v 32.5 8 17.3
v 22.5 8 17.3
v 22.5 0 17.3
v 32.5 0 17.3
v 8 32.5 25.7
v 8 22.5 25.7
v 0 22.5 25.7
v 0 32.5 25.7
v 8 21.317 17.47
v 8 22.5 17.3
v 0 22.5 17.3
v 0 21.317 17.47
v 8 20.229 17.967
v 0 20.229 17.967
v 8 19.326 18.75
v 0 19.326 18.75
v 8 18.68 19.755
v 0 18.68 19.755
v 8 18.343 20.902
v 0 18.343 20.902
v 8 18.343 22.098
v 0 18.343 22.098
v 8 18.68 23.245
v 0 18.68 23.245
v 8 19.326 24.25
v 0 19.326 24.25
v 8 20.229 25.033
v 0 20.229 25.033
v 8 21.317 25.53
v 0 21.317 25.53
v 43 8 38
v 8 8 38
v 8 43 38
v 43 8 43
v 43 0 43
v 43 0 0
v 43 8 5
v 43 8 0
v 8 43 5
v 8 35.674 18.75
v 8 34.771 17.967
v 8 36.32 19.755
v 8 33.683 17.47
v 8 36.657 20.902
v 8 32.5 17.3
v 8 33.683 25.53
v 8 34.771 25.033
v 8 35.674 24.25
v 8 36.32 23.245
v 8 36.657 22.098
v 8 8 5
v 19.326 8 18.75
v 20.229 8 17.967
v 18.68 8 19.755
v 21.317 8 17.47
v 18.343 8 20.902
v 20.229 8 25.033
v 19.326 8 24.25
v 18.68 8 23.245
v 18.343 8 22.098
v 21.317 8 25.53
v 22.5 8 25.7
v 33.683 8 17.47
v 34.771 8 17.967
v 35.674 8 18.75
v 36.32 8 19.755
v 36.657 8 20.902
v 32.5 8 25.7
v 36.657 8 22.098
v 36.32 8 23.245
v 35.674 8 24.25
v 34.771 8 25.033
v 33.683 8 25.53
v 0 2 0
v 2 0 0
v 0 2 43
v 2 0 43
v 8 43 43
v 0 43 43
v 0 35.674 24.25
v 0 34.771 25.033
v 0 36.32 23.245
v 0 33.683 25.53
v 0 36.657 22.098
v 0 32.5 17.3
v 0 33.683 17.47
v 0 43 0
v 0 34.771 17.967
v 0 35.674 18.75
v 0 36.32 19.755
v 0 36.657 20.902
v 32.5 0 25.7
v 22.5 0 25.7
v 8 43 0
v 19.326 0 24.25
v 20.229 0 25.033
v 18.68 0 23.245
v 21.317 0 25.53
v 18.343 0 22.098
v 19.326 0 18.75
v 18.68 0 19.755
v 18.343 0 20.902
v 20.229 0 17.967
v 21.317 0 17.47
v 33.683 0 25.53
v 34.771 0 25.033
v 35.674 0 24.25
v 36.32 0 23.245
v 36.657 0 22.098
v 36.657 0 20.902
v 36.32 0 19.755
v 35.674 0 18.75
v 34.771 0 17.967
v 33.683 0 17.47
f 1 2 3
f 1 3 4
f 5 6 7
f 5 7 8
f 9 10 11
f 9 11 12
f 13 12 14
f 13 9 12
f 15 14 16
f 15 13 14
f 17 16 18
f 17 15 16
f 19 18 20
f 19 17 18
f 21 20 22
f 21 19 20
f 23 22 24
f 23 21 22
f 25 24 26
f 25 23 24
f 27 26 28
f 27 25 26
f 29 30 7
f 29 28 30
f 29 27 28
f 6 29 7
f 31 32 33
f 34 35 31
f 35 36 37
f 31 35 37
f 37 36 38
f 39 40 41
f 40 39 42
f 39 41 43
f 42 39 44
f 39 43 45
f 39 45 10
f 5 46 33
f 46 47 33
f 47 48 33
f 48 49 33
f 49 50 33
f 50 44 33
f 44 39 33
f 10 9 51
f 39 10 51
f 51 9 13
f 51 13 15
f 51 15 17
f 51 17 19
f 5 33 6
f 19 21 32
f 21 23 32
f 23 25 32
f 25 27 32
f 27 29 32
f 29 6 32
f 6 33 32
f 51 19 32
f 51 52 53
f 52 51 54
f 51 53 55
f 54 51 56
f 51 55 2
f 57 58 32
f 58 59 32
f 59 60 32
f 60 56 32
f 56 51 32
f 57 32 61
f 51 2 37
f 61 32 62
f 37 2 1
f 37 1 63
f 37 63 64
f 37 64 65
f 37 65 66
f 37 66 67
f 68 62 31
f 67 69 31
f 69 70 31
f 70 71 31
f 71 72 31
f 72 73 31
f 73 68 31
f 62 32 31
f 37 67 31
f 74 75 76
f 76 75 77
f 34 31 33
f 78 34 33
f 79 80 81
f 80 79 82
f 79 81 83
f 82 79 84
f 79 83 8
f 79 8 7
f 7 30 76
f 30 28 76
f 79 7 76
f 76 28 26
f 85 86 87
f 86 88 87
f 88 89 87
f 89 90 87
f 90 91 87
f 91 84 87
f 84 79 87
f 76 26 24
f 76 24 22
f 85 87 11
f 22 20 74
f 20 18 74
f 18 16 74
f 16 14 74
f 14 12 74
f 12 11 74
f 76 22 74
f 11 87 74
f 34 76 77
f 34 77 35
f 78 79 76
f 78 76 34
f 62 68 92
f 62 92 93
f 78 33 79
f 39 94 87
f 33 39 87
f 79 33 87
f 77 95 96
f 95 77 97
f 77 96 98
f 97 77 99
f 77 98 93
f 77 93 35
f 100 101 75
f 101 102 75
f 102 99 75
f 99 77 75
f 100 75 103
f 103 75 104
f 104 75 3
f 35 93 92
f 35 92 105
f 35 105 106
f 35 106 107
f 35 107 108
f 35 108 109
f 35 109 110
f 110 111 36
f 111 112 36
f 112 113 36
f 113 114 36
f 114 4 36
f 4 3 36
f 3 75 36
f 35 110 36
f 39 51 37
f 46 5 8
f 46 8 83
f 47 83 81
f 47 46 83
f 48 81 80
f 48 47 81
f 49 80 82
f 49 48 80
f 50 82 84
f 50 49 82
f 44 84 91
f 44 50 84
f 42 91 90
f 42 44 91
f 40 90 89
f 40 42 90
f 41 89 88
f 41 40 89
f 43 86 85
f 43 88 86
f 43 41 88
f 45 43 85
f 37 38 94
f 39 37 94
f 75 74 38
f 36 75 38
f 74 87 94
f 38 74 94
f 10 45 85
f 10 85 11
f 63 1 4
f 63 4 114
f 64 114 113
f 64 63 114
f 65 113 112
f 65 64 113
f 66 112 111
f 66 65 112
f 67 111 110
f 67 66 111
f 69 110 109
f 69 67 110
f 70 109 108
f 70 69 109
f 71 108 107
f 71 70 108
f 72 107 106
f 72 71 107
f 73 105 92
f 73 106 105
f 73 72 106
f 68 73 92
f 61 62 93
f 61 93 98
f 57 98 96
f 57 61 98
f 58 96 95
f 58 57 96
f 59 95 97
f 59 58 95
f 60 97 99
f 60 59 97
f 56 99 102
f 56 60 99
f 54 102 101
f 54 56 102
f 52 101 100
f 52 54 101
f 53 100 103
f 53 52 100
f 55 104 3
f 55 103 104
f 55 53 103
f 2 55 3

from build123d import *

# Parameters (mm, degrees)
BOSS_EXTRU_1_DEPTH           = 43
ENL_V_MAT_EXTRU_1_DEPTH      = 16.5
ENL_V_MAT_EXTRU_2_DEPTH      = 36
ENL_V_MAT_EXTRU_2_DEPTH_BACK = 9
ENL_V_MAT_EXTRU_3_DEPTH      = 9
CHANFREIN1_SIZE              = 2


with BuildPart() as part:
    # Esquisse1 → Boss.-Extru.1 (new body)
    with BuildSketch(Plane.XY):
        Polygon((0, 43), (0, 0), (43, 0), (43, 8), (8, 43), align=None)
    extrude(amount=BOSS_EXTRU_1_DEPTH)

    # Esquisse2 → Enlèv. mat.-Extru.1 (cut, symmetric)
    with BuildSketch(Plane.XY.offset(21.5)):
        Polygon((8, 43.558751445), (8, 8), (47.774907193, 8), (49.427845989, 41.515592143), align=None)
    extrude(amount=ENL_V_MAT_EXTRU_1_DEPTH, both=True, mode=Mode.SUBTRACT)

    # Esquisse3 → Enlèv. mat.-Extru.2 (cut, two sides)
    with BuildSketch(Plane(origin=(8, 0, 0), x_dir=(0, 0, -1), z_dir=(1, 0, 0))) as enl_v_mat_extru_2_sk:
        with BuildLine():
            Line((-25.7, 22.5), (-25.7, 32.5))
            ThreePointArc((-25.7, 32.5), (-21.5, 36.7), (-17.3, 32.5))
            Line((-17.3, 32.5), (-17.3, 22.5))
            ThreePointArc((-17.3, 22.5), (-21.5, 18.3), (-25.7, 22.5))
        make_face()
    extrude(amount=ENL_V_MAT_EXTRU_2_DEPTH, mode=Mode.SUBTRACT)
    extrude(enl_v_mat_extru_2_sk.sketch, amount=-ENL_V_MAT_EXTRU_2_DEPTH_BACK, mode=Mode.SUBTRACT)

    # Esquisse4 → Enlèv. mat.-Extru.3 (cut, through all)
    with BuildSketch(Plane(origin=(0, 8, 0), x_dir=(1, 0, 0), z_dir=(0, 1, 0))):
        with BuildLine():
            Line((32.5, -25.7), (22.5, -25.7))
            ThreePointArc((22.5, -25.7), (18.3, -21.5), (22.5, -17.3))
            Line((22.5, -17.3), (32.5, -17.3))
            ThreePointArc((32.5, -17.3), (36.7, -21.5), (32.5, -25.7))
        make_face()
    extrude(amount=-ENL_V_MAT_EXTRU_3_DEPTH, mode=Mode.SUBTRACT)

    # Chanfrein1
    chanfrein1_edges = [part.edges().sort_by_distance(p)[0] for p in [
        (0, 0, 21.5),
    ]]
    chamfer(chanfrein1_edges, length=CHANFREIN1_SIZE)


solid = part.part
